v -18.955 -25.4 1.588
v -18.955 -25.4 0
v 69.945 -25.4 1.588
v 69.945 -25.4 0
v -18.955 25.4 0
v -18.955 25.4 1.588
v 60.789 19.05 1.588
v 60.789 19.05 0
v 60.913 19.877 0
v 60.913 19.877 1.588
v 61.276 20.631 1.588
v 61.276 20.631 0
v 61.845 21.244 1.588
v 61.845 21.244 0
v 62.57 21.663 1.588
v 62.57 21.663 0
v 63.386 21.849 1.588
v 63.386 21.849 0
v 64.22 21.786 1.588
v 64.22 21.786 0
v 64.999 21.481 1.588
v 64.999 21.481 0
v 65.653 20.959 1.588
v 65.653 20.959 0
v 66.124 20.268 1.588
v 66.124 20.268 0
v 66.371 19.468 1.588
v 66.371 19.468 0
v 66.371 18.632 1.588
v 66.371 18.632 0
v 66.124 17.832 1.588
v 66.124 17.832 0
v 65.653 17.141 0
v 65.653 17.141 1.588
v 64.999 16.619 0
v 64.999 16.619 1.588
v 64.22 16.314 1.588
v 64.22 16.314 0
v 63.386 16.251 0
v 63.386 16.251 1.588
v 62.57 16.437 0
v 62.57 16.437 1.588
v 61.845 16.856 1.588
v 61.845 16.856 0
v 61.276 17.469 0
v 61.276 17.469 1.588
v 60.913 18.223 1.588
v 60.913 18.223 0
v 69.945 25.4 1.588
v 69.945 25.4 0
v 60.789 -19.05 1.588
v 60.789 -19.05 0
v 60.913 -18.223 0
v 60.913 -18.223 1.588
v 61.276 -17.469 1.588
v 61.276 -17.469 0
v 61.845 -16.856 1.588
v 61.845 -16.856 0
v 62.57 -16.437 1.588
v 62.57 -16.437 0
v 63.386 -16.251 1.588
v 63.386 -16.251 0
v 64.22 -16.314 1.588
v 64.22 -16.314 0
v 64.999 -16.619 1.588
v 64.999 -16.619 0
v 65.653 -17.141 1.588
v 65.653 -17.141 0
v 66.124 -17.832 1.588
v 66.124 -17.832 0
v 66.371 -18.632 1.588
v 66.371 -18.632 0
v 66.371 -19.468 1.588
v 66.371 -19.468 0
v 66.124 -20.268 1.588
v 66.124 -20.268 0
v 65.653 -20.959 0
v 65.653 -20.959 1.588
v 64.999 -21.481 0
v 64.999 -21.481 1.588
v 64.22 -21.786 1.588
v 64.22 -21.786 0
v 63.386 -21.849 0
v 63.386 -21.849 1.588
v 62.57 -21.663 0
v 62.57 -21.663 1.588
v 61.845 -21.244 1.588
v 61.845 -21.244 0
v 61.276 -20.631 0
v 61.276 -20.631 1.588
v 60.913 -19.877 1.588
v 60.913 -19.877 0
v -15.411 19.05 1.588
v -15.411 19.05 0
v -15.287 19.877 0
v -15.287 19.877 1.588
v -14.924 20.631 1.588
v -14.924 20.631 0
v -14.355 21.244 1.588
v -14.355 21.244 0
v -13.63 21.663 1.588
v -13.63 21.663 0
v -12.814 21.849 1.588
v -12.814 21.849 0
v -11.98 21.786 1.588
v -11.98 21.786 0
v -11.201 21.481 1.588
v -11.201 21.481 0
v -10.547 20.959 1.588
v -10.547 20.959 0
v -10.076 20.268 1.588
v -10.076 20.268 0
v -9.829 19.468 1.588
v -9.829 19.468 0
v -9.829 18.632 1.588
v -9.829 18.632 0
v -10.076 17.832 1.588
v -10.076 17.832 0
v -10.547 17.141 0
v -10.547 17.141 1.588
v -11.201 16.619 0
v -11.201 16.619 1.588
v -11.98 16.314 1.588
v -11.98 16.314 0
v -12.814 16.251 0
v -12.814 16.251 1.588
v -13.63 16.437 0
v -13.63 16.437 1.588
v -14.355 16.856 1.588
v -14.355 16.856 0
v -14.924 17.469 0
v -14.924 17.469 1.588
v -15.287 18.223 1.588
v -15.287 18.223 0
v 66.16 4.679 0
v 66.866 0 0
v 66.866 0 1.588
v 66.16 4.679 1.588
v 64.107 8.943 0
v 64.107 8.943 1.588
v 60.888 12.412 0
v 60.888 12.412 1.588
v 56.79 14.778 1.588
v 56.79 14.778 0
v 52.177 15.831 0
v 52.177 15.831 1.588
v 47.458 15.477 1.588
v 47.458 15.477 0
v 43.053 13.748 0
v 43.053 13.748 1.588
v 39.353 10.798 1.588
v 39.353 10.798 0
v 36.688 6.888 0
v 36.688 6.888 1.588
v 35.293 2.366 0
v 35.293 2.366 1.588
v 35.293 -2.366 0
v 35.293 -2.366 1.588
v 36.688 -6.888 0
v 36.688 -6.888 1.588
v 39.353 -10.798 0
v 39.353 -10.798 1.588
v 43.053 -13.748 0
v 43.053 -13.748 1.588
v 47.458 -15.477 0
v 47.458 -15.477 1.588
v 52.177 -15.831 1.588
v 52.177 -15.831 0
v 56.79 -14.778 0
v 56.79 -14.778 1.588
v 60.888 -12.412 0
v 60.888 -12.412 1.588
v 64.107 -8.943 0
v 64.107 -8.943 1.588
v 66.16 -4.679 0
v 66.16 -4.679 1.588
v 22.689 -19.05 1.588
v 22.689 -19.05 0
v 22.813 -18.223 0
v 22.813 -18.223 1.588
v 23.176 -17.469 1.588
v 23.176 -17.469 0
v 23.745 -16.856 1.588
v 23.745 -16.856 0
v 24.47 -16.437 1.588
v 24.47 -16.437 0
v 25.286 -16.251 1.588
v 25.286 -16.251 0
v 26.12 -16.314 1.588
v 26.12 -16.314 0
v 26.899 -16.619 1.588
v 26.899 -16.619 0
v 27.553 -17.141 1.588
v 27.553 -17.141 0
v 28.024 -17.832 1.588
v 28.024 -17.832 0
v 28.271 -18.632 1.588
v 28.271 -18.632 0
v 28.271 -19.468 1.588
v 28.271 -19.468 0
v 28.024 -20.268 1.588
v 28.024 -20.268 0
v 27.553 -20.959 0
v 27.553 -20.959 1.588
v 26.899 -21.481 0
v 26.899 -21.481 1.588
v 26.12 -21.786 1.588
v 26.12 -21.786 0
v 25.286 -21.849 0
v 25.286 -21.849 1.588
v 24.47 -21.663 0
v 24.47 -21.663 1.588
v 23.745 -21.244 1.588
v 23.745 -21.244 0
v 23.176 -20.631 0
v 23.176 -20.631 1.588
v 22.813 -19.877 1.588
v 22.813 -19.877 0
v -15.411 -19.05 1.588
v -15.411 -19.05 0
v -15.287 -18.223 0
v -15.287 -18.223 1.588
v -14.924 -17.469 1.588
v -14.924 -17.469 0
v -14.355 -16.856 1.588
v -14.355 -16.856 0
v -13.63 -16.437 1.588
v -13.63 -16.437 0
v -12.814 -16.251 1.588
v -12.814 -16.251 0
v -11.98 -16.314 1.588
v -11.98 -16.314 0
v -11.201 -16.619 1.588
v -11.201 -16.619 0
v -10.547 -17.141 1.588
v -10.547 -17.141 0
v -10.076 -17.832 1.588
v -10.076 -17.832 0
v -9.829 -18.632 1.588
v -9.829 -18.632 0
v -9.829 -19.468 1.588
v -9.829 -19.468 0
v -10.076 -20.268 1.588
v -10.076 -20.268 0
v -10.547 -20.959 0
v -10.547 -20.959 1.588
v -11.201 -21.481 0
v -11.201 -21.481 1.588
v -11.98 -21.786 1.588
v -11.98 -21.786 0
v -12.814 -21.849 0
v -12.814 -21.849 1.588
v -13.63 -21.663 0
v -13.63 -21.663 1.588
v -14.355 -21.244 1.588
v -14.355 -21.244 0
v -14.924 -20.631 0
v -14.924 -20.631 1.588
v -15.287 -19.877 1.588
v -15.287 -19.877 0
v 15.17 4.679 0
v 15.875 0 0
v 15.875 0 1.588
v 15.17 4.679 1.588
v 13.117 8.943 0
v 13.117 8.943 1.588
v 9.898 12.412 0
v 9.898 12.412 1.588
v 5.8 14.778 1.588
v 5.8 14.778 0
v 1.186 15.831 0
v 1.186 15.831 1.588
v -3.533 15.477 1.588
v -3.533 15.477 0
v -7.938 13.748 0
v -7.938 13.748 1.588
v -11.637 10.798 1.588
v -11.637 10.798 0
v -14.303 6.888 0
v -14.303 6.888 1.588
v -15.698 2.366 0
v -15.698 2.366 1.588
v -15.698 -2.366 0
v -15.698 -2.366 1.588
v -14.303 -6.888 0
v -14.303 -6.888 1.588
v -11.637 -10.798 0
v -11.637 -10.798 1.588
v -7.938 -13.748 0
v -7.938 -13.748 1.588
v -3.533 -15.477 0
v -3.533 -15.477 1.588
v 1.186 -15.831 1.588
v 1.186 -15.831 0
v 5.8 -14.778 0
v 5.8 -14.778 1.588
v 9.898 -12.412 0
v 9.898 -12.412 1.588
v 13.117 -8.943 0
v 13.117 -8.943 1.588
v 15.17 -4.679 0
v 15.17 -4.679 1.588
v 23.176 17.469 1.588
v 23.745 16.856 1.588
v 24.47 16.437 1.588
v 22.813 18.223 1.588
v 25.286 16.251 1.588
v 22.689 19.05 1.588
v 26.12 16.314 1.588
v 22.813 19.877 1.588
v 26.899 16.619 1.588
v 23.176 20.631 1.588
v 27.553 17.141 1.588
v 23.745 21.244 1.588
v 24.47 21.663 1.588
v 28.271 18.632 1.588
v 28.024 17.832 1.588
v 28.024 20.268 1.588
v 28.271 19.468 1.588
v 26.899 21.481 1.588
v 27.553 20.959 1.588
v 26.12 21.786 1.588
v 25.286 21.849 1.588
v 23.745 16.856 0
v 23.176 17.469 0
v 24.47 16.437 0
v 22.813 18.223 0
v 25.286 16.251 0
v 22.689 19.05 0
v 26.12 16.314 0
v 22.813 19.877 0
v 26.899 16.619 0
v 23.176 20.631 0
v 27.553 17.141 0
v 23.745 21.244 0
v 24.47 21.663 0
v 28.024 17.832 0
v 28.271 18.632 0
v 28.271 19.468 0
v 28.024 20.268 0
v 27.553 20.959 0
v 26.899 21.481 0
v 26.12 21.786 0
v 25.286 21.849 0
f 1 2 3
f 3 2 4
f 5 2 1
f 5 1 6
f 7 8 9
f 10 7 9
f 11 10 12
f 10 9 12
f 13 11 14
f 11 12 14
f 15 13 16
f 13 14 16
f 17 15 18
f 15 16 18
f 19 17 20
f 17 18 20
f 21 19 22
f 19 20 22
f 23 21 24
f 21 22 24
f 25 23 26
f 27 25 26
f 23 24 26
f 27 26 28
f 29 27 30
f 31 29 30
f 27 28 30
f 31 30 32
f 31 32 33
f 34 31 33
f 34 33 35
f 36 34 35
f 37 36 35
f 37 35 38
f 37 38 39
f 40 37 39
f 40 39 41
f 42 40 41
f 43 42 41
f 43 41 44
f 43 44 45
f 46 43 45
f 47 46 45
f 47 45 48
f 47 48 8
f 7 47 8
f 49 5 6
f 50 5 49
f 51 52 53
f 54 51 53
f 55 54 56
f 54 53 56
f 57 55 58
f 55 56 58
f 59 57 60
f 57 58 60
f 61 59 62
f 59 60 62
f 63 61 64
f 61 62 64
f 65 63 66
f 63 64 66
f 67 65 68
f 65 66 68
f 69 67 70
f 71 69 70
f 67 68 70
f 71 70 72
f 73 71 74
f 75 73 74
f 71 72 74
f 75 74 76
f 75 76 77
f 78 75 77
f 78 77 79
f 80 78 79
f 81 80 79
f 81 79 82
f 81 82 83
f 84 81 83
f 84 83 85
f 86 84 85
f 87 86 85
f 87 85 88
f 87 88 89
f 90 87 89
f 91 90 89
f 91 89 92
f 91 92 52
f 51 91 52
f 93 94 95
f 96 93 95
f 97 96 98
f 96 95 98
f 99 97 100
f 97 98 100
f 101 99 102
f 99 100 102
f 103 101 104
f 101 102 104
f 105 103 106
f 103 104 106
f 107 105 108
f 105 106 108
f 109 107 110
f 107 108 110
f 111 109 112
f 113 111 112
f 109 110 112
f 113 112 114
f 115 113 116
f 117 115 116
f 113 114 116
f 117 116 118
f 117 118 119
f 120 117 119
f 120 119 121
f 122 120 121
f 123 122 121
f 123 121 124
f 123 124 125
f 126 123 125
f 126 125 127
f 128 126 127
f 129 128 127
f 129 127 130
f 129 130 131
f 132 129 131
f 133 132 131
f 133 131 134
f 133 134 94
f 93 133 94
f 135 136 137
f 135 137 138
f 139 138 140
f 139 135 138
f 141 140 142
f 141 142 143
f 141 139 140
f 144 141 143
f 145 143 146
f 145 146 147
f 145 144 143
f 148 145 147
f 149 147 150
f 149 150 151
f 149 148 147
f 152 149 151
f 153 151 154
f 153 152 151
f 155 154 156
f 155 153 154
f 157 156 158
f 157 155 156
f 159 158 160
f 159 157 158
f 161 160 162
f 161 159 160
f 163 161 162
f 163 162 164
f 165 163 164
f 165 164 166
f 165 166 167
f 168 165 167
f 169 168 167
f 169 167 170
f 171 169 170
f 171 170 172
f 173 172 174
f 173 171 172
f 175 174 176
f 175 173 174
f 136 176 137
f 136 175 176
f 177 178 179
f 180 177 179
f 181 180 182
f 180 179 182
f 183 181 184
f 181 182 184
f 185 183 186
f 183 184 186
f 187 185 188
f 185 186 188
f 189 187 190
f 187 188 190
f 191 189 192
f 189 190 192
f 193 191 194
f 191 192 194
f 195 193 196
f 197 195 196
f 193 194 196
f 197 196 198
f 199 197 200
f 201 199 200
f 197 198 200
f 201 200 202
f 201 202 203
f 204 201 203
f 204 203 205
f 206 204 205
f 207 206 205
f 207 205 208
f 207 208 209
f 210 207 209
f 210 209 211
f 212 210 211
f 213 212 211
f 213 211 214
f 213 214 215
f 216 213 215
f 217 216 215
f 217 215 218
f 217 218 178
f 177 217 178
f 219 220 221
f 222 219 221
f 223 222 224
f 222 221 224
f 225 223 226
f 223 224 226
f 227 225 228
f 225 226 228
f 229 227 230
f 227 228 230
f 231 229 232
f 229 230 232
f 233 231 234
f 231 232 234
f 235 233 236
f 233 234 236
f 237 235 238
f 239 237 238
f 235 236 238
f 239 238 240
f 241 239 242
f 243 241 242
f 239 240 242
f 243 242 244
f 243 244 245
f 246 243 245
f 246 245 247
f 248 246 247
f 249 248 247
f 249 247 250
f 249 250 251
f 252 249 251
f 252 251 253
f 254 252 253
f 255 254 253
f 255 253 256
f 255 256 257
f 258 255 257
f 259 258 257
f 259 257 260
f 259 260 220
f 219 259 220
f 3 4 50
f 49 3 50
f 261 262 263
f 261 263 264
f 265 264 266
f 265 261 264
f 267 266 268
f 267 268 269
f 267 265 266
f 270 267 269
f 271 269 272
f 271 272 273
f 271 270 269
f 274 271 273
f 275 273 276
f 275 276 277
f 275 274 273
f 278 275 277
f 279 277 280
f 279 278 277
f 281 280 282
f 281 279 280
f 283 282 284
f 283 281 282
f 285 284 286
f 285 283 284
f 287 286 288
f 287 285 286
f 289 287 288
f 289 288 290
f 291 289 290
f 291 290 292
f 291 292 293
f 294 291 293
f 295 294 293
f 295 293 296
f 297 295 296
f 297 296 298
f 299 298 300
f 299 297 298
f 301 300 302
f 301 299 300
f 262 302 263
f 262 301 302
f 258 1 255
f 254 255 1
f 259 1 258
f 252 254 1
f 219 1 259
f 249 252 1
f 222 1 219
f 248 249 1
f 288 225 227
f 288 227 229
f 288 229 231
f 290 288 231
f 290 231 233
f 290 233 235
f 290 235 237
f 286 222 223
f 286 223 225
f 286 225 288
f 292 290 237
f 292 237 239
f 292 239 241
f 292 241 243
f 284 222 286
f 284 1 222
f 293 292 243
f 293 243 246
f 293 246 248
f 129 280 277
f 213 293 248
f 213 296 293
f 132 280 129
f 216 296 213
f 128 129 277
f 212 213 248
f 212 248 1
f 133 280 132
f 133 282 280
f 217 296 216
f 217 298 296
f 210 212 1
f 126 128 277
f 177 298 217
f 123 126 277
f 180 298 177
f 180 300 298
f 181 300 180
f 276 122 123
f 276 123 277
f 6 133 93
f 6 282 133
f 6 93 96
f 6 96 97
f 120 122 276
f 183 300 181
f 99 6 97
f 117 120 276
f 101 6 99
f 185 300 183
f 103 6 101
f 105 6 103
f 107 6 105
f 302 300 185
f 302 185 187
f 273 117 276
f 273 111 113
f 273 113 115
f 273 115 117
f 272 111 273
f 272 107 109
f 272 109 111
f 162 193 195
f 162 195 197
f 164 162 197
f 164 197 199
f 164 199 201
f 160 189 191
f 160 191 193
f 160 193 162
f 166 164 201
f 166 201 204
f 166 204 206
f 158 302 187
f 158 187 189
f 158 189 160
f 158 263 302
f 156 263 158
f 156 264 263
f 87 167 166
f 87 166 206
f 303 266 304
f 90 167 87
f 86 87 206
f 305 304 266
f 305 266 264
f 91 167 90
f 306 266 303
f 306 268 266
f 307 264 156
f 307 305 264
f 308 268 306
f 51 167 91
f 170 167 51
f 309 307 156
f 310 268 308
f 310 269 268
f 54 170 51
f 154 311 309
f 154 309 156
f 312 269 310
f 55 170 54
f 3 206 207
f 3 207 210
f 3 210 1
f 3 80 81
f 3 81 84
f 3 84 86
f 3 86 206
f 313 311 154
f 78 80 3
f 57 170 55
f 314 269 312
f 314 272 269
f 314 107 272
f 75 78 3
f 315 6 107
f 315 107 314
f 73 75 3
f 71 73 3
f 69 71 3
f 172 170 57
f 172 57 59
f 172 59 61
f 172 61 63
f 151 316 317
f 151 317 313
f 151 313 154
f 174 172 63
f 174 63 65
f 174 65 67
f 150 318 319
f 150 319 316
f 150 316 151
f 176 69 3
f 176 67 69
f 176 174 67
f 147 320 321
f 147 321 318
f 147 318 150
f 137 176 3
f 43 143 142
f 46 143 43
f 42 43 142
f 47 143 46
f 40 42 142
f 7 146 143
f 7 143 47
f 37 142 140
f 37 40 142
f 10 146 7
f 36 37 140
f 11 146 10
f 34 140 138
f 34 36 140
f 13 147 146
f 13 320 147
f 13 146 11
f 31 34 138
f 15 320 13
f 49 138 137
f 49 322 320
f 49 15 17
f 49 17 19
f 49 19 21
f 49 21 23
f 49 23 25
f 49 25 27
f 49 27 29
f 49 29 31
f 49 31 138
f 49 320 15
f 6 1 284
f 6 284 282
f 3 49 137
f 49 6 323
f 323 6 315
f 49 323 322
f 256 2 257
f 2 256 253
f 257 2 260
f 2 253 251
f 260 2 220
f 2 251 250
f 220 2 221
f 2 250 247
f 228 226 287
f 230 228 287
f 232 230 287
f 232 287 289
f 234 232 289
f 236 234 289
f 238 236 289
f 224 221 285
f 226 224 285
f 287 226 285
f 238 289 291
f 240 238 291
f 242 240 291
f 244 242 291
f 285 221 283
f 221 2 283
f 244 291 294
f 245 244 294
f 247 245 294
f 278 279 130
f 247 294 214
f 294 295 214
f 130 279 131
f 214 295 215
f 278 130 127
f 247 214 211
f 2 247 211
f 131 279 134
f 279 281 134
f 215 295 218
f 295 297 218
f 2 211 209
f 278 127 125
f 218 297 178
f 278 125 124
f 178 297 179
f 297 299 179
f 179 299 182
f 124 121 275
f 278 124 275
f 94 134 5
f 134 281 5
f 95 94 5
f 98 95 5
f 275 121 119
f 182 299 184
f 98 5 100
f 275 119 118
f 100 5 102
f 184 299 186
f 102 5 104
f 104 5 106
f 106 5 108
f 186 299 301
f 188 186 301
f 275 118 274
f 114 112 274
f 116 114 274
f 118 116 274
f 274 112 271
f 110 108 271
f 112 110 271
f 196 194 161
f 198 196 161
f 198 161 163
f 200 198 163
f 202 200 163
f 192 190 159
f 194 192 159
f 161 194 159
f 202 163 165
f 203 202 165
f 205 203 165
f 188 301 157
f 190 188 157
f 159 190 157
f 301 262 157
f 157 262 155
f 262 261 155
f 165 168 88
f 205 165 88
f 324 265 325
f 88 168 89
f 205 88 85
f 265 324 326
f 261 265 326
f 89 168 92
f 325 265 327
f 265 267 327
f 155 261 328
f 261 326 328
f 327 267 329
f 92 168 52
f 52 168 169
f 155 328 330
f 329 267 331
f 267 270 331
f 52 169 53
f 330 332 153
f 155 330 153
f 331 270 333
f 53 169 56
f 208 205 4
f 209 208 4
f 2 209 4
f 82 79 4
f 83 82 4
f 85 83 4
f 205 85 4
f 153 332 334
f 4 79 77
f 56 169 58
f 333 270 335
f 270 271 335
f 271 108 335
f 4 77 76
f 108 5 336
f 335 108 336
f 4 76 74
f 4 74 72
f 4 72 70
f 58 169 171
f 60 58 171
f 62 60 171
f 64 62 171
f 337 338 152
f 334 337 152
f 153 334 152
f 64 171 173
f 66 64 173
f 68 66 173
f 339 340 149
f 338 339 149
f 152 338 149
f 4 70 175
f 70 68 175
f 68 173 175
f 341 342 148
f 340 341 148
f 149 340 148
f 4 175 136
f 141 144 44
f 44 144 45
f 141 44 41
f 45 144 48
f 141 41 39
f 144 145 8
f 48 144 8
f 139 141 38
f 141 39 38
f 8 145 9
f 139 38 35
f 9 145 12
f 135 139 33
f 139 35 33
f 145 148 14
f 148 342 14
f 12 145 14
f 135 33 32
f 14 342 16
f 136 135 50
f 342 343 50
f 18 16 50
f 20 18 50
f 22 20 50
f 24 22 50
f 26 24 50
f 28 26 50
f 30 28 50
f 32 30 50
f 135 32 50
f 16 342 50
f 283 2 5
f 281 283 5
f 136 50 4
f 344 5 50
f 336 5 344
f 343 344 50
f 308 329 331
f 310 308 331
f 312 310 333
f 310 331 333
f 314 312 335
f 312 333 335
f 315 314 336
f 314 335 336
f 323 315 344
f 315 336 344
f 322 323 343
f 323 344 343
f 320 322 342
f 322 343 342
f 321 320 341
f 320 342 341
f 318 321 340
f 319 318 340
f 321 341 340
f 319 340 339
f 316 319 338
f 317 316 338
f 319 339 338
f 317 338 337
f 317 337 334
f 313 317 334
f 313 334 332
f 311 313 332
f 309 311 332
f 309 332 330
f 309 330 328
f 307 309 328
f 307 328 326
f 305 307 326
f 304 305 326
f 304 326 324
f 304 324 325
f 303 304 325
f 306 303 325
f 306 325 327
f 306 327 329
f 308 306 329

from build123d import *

# Parameters (mm, degrees)
SKETCH1_W              = 88.9
SKETCH1_H              = 50.8
SKETCH1_R              = 15.875
BOSS_EXTRUDE1_DEPTH    = 1.5875
F_10_CLEARANCE_HOLE1_D = 5.6134


with BuildPart() as part:
    # Sketch1 → Boss-Extrude1 (new body)
    with BuildSketch(Plane.XY):
        with Locations((25.49525, 0)):
            Rectangle(SKETCH1_W, SKETCH1_H)
        Circle(SKETCH1_R, mode=Mode.SUBTRACT)
        with Locations((50.9905, 0)):
            Circle(SKETCH1_R, mode=Mode.SUBTRACT)
    extrude(amount=BOSS_EXTRUDE1_DEPTH)

    # #10 Clearance Hole1 (through all)
    with Locations(Plane(origin=(-41.275, -44.45, 1.5875), x_dir=(1, 0, 0), z_dir=(0, 0, 1))):
        with Locations((104.87025, 63.5), (28.67025, 63.5), (66.77025, 25.4), (28.67025, 25.4), (66.77025, 63.5), (104.87025, 25.4)):
            Hole(F_10_CLEARANCE_HOLE1_D / 2)


solid = part.part
